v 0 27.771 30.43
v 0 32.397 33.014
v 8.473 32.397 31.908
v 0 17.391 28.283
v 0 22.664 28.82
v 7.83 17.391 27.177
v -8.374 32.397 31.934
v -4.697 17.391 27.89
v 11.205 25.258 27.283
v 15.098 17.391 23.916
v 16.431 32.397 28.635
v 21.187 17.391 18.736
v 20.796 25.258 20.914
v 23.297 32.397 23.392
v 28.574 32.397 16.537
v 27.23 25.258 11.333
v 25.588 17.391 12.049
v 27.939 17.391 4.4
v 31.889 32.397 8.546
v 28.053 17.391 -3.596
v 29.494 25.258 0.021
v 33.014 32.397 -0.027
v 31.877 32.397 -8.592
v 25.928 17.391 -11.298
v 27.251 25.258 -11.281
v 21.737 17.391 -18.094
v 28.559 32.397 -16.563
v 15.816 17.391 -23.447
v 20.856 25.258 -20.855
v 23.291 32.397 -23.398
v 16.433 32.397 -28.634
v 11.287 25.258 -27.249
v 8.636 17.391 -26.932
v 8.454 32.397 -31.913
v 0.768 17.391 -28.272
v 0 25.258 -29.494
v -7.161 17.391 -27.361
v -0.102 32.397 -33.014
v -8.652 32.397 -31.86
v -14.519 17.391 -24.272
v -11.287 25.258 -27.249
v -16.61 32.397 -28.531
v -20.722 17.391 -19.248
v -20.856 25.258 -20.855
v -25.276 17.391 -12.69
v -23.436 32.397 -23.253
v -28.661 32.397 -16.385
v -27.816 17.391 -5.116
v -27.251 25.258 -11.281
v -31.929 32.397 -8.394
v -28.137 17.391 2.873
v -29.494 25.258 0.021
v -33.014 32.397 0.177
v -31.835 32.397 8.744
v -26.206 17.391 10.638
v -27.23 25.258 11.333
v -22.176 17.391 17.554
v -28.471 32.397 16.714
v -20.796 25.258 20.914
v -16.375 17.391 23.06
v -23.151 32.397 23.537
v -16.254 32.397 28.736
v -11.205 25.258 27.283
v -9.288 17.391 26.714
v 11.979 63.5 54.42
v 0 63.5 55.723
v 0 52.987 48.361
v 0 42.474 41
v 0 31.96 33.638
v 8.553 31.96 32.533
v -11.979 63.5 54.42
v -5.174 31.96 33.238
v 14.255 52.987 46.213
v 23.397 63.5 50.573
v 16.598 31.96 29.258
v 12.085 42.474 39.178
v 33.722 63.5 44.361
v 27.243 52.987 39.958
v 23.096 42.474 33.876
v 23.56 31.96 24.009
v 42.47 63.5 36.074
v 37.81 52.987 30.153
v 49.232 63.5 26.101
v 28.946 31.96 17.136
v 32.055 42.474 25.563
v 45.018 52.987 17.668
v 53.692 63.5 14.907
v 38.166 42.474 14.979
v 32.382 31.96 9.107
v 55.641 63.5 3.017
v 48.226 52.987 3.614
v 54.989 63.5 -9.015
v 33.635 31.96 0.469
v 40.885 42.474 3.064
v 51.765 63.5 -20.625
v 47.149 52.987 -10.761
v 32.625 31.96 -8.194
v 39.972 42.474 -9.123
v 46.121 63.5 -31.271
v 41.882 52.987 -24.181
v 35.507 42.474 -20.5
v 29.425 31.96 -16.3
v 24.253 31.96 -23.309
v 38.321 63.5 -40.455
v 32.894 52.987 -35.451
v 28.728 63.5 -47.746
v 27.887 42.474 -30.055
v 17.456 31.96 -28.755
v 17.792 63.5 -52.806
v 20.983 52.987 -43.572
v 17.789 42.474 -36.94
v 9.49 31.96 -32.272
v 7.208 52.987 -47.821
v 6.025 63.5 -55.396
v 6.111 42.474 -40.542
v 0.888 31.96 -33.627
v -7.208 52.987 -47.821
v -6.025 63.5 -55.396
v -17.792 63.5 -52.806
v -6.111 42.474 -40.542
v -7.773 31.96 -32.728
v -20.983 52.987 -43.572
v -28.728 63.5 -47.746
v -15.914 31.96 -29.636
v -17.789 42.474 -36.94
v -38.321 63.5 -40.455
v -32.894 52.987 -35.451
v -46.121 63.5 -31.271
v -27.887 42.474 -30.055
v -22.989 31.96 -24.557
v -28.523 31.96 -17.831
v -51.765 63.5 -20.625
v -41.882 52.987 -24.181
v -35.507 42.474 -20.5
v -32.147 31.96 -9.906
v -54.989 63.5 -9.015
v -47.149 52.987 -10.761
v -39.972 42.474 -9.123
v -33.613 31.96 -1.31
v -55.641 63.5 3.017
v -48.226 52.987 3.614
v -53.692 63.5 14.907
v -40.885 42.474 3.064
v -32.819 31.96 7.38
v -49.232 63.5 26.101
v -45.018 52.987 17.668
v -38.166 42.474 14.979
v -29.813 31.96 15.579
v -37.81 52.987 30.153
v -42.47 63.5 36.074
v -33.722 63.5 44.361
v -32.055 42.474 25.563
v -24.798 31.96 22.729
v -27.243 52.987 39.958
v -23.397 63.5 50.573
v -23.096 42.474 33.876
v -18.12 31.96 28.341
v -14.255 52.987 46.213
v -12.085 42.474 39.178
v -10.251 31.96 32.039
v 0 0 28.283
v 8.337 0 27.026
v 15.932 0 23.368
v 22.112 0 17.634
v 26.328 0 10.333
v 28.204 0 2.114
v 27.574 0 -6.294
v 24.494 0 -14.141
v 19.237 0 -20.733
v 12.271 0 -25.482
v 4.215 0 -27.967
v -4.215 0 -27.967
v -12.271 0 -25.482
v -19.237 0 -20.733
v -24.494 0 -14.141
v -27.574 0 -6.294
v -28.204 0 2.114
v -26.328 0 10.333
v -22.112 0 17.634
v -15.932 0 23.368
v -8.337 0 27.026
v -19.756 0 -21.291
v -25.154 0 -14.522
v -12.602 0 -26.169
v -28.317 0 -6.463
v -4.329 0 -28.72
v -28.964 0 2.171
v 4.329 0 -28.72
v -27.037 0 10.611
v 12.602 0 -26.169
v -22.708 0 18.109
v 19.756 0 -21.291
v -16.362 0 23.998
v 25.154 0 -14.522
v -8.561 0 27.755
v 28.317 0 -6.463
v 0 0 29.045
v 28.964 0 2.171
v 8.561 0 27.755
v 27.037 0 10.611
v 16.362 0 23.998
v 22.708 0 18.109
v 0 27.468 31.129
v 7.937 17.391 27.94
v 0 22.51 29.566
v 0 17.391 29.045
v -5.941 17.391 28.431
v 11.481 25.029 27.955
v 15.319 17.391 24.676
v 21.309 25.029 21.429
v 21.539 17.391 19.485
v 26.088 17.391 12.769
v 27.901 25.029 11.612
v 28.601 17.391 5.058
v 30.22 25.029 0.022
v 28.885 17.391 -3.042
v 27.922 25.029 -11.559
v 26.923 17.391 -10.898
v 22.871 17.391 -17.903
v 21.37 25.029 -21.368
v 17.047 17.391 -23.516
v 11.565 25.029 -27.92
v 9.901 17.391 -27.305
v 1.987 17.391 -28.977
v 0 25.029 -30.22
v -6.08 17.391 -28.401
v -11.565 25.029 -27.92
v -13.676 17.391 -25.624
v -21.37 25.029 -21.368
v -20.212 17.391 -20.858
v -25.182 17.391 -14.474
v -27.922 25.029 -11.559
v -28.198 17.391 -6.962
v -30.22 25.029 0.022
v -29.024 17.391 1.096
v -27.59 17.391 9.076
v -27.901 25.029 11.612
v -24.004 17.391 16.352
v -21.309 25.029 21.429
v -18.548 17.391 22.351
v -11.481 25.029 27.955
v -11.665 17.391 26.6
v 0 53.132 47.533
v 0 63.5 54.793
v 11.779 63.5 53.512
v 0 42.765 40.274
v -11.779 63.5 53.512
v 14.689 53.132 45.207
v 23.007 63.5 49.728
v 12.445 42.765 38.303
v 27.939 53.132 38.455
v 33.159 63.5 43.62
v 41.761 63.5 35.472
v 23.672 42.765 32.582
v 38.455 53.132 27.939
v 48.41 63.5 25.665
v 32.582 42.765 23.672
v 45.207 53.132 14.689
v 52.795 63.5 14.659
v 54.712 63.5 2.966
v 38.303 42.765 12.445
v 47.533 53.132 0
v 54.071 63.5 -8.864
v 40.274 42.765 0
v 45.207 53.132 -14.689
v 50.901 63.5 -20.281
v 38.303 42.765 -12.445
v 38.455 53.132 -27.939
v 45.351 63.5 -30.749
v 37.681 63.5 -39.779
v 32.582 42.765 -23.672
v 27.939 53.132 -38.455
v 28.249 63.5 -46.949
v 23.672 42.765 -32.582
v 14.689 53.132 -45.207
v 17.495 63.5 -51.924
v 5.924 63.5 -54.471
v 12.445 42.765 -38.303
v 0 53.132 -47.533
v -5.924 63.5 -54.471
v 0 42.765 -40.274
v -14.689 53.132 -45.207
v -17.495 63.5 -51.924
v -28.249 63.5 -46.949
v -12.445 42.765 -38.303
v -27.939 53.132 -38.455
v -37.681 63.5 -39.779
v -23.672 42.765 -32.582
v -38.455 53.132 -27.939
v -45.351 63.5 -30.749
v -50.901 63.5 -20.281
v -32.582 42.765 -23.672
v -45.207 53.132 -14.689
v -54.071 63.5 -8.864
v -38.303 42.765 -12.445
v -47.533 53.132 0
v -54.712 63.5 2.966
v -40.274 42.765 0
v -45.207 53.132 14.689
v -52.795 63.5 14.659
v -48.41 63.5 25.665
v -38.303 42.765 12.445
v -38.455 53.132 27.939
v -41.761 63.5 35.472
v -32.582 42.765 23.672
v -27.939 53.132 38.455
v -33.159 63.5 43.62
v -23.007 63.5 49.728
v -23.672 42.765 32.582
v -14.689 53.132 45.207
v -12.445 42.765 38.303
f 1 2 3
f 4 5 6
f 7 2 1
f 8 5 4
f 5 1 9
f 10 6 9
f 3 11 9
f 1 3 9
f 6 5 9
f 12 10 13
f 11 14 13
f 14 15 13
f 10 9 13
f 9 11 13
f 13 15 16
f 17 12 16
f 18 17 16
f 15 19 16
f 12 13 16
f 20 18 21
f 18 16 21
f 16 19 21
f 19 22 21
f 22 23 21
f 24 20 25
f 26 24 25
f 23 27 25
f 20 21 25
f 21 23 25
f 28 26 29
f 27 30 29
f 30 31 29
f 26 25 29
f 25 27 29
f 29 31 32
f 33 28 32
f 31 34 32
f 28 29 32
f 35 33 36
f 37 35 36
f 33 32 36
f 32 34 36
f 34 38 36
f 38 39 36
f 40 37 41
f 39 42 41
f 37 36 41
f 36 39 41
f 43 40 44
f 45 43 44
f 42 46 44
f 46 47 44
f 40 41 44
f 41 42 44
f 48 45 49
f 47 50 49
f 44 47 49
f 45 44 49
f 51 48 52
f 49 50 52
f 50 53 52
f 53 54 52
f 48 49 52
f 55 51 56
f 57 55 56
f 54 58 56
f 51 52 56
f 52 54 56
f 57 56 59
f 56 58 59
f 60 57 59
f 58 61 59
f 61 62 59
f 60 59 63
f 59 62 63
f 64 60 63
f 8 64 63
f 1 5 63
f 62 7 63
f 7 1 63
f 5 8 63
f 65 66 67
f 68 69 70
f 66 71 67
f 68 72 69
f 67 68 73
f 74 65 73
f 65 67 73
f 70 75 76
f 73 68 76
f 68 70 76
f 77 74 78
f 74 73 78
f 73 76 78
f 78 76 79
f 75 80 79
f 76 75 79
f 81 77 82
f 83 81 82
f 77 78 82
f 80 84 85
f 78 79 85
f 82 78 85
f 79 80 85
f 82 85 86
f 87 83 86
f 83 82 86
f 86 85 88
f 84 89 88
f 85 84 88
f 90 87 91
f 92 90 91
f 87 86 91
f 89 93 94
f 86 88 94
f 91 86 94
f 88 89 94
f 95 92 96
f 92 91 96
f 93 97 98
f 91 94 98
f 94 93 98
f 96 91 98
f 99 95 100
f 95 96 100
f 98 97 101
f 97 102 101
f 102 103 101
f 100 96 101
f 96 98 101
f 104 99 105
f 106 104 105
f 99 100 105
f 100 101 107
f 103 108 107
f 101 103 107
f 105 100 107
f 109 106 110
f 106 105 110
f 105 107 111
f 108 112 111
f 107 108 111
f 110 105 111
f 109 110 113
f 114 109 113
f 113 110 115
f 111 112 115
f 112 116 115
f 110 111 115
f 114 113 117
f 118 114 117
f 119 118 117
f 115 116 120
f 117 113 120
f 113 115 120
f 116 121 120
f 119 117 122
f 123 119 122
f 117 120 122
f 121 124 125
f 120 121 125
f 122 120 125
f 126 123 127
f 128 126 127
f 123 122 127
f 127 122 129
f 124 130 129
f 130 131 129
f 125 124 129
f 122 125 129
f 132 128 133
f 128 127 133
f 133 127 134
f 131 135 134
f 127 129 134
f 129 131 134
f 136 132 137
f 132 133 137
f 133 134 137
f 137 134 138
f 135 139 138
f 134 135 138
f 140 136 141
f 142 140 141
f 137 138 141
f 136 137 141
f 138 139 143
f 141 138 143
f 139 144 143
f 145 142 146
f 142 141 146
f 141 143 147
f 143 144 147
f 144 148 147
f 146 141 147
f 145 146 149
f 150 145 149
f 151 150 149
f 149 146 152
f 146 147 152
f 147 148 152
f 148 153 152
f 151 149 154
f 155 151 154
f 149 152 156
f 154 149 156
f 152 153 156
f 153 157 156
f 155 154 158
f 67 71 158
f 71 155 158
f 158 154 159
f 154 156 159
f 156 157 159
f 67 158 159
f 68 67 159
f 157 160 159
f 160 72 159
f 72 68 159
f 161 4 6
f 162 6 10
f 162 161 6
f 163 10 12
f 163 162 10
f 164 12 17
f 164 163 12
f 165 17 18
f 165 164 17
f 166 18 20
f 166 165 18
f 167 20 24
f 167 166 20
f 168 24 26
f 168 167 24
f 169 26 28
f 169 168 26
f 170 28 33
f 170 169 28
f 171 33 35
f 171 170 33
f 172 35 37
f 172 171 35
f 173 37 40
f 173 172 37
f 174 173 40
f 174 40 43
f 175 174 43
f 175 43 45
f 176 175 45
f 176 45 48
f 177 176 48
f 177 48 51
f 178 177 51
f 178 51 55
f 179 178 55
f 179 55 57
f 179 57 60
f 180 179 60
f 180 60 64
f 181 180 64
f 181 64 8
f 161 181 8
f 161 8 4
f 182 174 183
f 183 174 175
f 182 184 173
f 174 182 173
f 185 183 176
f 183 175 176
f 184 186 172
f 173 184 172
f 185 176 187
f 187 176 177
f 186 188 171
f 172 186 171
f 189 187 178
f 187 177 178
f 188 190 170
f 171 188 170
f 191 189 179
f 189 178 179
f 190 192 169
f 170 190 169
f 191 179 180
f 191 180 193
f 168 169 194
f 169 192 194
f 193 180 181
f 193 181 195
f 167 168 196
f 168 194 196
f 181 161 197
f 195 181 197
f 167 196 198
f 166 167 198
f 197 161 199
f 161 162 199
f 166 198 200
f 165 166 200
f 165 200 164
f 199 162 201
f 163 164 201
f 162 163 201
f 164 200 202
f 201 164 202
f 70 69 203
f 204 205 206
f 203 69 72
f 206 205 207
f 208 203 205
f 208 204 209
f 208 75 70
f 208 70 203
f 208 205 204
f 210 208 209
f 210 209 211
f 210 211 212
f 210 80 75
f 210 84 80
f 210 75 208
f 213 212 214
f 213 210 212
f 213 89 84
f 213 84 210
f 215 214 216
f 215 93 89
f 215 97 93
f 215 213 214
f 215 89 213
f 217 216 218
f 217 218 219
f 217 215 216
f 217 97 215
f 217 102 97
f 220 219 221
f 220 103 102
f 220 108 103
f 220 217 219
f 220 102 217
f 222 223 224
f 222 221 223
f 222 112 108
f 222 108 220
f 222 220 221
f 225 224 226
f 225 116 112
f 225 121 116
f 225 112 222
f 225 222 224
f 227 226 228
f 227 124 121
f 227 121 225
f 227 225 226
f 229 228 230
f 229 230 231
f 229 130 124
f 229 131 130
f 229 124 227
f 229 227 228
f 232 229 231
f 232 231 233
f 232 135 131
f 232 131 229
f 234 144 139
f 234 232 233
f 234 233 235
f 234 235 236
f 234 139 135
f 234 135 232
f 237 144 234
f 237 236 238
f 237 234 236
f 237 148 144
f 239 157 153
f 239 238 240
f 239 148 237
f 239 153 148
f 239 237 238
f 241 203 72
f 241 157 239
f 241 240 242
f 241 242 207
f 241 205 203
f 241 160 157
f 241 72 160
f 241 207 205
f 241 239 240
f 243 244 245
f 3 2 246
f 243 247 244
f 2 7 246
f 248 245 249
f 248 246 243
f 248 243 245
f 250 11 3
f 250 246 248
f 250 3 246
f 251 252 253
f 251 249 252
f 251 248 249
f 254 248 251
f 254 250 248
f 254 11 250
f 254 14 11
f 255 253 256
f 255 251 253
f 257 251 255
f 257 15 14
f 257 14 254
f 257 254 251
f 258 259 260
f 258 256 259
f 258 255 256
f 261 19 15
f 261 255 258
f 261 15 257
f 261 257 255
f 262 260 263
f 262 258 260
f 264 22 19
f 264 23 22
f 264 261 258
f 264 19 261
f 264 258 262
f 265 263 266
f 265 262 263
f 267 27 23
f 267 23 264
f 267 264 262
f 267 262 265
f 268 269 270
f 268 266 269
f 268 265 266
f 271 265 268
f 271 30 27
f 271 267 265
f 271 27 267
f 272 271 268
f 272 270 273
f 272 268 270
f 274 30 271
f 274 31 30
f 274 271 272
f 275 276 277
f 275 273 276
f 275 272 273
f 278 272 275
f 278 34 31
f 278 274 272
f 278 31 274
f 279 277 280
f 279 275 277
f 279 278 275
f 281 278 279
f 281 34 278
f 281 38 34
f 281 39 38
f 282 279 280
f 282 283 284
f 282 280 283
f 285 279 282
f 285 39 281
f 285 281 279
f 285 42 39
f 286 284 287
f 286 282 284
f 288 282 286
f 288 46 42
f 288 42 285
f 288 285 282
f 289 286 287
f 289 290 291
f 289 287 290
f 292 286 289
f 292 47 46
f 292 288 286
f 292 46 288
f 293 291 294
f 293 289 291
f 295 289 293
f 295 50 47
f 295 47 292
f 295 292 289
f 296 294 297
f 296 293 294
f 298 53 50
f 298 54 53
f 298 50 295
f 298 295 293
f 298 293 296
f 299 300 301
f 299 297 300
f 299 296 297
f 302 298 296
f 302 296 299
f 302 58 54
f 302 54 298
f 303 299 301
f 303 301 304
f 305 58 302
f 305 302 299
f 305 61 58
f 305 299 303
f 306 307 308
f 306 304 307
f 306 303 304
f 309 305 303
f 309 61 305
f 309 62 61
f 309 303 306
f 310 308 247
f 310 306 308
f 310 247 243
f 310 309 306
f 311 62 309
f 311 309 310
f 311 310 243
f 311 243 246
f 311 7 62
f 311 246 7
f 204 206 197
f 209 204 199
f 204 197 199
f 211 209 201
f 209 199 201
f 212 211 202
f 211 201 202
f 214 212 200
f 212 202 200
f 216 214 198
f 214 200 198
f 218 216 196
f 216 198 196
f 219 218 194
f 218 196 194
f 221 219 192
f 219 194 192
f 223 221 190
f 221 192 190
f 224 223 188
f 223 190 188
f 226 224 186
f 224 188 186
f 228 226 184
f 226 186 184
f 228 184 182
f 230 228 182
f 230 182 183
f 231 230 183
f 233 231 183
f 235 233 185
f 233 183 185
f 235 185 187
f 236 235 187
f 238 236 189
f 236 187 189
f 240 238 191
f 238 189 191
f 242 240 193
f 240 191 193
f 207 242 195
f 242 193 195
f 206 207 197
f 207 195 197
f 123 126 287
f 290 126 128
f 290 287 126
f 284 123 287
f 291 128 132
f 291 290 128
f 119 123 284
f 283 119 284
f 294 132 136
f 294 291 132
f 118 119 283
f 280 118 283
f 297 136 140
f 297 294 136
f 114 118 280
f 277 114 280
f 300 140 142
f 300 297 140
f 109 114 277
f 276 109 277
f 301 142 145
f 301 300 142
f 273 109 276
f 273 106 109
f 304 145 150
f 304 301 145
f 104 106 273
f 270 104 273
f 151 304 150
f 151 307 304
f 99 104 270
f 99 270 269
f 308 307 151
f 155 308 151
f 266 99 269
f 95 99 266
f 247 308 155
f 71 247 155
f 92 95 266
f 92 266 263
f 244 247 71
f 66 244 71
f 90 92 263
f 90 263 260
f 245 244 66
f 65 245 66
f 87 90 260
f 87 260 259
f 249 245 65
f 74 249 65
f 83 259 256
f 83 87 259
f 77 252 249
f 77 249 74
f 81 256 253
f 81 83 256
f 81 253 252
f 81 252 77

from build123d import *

# Parameters (mm, degrees)
SKETCH1_R           = 29.0449
BOSS_EXTRUDE3_DEPTH = 25.4
SKETCH6_R           = 29.0449
BOSS_EXTRUDE4_DEPTH = 38.1
BOSS_EXTRUDE4_DRAFT = -35
FILLET1_R           = 25.4
SHELL2_T            = -0.762


with BuildPart() as part:
    # Sketch1 → Boss-Extrude3 (new body)
    with BuildSketch(Plane(origin=(0, 0, 0), x_dir=(1, 0, 0), z_dir=(0, 1, 0))):
        with Locations(Location((0, 0, 0), (0, 0, 270))):
            Circle(SKETCH1_R)
    extrude(amount=BOSS_EXTRUDE3_DEPTH)


with BuildPart() as boss_extrude4_tool:
    # Sketch6 → Boss-Extrude4 (with draft: the straight prism first)
    with BuildSketch(Plane(origin=(0, 25.4, 0), x_dir=(1, 0, 0), z_dir=(0, 1, 0))):
        with Locations(Location((0, 0, 0), (0, 0, 270))):
            Circle(SKETCH6_R)
    extrude(amount=BOSS_EXTRUDE4_DEPTH)
    # Boss-Extrude4: the draft: its side faces are tilted about the plane it starts from
    boss_extrude4_sides = [boss_extrude4_tool.faces().sort_by_distance(p)[0] for p in [
        (0, 44.45, -29.0449),
    ]]
    draft(boss_extrude4_sides, Plane(origin=(0, 25.4, 0), x_dir=(1, 0, 0), z_dir=(0, 1, 0)), BOSS_EXTRUDE4_DRAFT)


with BuildPart() as part_1:
    add(part.part)

    # Boss-Extrude4: add boss_extrude4_tool
    add(boss_extrude4_tool.part)

    # Fillet1
    fillet1_edges = [part_1.edges().sort_by_distance(p)[0] for p in [
        (0, 25.4, -29.0449),
    ]]
    fillet(fillet1_edges, radius=FILLET1_R)

    # Shell2
    shell2_openings = [part_1.faces().sort_by_distance(p)[0] for p in [
        (0, 0, 0),
        (0, 63.5, 0),
    ]]
    offset(amount=SHELL2_T, openings=shell2_openings, kind=Kind.INTERSECTION)


solid = part_1.part
